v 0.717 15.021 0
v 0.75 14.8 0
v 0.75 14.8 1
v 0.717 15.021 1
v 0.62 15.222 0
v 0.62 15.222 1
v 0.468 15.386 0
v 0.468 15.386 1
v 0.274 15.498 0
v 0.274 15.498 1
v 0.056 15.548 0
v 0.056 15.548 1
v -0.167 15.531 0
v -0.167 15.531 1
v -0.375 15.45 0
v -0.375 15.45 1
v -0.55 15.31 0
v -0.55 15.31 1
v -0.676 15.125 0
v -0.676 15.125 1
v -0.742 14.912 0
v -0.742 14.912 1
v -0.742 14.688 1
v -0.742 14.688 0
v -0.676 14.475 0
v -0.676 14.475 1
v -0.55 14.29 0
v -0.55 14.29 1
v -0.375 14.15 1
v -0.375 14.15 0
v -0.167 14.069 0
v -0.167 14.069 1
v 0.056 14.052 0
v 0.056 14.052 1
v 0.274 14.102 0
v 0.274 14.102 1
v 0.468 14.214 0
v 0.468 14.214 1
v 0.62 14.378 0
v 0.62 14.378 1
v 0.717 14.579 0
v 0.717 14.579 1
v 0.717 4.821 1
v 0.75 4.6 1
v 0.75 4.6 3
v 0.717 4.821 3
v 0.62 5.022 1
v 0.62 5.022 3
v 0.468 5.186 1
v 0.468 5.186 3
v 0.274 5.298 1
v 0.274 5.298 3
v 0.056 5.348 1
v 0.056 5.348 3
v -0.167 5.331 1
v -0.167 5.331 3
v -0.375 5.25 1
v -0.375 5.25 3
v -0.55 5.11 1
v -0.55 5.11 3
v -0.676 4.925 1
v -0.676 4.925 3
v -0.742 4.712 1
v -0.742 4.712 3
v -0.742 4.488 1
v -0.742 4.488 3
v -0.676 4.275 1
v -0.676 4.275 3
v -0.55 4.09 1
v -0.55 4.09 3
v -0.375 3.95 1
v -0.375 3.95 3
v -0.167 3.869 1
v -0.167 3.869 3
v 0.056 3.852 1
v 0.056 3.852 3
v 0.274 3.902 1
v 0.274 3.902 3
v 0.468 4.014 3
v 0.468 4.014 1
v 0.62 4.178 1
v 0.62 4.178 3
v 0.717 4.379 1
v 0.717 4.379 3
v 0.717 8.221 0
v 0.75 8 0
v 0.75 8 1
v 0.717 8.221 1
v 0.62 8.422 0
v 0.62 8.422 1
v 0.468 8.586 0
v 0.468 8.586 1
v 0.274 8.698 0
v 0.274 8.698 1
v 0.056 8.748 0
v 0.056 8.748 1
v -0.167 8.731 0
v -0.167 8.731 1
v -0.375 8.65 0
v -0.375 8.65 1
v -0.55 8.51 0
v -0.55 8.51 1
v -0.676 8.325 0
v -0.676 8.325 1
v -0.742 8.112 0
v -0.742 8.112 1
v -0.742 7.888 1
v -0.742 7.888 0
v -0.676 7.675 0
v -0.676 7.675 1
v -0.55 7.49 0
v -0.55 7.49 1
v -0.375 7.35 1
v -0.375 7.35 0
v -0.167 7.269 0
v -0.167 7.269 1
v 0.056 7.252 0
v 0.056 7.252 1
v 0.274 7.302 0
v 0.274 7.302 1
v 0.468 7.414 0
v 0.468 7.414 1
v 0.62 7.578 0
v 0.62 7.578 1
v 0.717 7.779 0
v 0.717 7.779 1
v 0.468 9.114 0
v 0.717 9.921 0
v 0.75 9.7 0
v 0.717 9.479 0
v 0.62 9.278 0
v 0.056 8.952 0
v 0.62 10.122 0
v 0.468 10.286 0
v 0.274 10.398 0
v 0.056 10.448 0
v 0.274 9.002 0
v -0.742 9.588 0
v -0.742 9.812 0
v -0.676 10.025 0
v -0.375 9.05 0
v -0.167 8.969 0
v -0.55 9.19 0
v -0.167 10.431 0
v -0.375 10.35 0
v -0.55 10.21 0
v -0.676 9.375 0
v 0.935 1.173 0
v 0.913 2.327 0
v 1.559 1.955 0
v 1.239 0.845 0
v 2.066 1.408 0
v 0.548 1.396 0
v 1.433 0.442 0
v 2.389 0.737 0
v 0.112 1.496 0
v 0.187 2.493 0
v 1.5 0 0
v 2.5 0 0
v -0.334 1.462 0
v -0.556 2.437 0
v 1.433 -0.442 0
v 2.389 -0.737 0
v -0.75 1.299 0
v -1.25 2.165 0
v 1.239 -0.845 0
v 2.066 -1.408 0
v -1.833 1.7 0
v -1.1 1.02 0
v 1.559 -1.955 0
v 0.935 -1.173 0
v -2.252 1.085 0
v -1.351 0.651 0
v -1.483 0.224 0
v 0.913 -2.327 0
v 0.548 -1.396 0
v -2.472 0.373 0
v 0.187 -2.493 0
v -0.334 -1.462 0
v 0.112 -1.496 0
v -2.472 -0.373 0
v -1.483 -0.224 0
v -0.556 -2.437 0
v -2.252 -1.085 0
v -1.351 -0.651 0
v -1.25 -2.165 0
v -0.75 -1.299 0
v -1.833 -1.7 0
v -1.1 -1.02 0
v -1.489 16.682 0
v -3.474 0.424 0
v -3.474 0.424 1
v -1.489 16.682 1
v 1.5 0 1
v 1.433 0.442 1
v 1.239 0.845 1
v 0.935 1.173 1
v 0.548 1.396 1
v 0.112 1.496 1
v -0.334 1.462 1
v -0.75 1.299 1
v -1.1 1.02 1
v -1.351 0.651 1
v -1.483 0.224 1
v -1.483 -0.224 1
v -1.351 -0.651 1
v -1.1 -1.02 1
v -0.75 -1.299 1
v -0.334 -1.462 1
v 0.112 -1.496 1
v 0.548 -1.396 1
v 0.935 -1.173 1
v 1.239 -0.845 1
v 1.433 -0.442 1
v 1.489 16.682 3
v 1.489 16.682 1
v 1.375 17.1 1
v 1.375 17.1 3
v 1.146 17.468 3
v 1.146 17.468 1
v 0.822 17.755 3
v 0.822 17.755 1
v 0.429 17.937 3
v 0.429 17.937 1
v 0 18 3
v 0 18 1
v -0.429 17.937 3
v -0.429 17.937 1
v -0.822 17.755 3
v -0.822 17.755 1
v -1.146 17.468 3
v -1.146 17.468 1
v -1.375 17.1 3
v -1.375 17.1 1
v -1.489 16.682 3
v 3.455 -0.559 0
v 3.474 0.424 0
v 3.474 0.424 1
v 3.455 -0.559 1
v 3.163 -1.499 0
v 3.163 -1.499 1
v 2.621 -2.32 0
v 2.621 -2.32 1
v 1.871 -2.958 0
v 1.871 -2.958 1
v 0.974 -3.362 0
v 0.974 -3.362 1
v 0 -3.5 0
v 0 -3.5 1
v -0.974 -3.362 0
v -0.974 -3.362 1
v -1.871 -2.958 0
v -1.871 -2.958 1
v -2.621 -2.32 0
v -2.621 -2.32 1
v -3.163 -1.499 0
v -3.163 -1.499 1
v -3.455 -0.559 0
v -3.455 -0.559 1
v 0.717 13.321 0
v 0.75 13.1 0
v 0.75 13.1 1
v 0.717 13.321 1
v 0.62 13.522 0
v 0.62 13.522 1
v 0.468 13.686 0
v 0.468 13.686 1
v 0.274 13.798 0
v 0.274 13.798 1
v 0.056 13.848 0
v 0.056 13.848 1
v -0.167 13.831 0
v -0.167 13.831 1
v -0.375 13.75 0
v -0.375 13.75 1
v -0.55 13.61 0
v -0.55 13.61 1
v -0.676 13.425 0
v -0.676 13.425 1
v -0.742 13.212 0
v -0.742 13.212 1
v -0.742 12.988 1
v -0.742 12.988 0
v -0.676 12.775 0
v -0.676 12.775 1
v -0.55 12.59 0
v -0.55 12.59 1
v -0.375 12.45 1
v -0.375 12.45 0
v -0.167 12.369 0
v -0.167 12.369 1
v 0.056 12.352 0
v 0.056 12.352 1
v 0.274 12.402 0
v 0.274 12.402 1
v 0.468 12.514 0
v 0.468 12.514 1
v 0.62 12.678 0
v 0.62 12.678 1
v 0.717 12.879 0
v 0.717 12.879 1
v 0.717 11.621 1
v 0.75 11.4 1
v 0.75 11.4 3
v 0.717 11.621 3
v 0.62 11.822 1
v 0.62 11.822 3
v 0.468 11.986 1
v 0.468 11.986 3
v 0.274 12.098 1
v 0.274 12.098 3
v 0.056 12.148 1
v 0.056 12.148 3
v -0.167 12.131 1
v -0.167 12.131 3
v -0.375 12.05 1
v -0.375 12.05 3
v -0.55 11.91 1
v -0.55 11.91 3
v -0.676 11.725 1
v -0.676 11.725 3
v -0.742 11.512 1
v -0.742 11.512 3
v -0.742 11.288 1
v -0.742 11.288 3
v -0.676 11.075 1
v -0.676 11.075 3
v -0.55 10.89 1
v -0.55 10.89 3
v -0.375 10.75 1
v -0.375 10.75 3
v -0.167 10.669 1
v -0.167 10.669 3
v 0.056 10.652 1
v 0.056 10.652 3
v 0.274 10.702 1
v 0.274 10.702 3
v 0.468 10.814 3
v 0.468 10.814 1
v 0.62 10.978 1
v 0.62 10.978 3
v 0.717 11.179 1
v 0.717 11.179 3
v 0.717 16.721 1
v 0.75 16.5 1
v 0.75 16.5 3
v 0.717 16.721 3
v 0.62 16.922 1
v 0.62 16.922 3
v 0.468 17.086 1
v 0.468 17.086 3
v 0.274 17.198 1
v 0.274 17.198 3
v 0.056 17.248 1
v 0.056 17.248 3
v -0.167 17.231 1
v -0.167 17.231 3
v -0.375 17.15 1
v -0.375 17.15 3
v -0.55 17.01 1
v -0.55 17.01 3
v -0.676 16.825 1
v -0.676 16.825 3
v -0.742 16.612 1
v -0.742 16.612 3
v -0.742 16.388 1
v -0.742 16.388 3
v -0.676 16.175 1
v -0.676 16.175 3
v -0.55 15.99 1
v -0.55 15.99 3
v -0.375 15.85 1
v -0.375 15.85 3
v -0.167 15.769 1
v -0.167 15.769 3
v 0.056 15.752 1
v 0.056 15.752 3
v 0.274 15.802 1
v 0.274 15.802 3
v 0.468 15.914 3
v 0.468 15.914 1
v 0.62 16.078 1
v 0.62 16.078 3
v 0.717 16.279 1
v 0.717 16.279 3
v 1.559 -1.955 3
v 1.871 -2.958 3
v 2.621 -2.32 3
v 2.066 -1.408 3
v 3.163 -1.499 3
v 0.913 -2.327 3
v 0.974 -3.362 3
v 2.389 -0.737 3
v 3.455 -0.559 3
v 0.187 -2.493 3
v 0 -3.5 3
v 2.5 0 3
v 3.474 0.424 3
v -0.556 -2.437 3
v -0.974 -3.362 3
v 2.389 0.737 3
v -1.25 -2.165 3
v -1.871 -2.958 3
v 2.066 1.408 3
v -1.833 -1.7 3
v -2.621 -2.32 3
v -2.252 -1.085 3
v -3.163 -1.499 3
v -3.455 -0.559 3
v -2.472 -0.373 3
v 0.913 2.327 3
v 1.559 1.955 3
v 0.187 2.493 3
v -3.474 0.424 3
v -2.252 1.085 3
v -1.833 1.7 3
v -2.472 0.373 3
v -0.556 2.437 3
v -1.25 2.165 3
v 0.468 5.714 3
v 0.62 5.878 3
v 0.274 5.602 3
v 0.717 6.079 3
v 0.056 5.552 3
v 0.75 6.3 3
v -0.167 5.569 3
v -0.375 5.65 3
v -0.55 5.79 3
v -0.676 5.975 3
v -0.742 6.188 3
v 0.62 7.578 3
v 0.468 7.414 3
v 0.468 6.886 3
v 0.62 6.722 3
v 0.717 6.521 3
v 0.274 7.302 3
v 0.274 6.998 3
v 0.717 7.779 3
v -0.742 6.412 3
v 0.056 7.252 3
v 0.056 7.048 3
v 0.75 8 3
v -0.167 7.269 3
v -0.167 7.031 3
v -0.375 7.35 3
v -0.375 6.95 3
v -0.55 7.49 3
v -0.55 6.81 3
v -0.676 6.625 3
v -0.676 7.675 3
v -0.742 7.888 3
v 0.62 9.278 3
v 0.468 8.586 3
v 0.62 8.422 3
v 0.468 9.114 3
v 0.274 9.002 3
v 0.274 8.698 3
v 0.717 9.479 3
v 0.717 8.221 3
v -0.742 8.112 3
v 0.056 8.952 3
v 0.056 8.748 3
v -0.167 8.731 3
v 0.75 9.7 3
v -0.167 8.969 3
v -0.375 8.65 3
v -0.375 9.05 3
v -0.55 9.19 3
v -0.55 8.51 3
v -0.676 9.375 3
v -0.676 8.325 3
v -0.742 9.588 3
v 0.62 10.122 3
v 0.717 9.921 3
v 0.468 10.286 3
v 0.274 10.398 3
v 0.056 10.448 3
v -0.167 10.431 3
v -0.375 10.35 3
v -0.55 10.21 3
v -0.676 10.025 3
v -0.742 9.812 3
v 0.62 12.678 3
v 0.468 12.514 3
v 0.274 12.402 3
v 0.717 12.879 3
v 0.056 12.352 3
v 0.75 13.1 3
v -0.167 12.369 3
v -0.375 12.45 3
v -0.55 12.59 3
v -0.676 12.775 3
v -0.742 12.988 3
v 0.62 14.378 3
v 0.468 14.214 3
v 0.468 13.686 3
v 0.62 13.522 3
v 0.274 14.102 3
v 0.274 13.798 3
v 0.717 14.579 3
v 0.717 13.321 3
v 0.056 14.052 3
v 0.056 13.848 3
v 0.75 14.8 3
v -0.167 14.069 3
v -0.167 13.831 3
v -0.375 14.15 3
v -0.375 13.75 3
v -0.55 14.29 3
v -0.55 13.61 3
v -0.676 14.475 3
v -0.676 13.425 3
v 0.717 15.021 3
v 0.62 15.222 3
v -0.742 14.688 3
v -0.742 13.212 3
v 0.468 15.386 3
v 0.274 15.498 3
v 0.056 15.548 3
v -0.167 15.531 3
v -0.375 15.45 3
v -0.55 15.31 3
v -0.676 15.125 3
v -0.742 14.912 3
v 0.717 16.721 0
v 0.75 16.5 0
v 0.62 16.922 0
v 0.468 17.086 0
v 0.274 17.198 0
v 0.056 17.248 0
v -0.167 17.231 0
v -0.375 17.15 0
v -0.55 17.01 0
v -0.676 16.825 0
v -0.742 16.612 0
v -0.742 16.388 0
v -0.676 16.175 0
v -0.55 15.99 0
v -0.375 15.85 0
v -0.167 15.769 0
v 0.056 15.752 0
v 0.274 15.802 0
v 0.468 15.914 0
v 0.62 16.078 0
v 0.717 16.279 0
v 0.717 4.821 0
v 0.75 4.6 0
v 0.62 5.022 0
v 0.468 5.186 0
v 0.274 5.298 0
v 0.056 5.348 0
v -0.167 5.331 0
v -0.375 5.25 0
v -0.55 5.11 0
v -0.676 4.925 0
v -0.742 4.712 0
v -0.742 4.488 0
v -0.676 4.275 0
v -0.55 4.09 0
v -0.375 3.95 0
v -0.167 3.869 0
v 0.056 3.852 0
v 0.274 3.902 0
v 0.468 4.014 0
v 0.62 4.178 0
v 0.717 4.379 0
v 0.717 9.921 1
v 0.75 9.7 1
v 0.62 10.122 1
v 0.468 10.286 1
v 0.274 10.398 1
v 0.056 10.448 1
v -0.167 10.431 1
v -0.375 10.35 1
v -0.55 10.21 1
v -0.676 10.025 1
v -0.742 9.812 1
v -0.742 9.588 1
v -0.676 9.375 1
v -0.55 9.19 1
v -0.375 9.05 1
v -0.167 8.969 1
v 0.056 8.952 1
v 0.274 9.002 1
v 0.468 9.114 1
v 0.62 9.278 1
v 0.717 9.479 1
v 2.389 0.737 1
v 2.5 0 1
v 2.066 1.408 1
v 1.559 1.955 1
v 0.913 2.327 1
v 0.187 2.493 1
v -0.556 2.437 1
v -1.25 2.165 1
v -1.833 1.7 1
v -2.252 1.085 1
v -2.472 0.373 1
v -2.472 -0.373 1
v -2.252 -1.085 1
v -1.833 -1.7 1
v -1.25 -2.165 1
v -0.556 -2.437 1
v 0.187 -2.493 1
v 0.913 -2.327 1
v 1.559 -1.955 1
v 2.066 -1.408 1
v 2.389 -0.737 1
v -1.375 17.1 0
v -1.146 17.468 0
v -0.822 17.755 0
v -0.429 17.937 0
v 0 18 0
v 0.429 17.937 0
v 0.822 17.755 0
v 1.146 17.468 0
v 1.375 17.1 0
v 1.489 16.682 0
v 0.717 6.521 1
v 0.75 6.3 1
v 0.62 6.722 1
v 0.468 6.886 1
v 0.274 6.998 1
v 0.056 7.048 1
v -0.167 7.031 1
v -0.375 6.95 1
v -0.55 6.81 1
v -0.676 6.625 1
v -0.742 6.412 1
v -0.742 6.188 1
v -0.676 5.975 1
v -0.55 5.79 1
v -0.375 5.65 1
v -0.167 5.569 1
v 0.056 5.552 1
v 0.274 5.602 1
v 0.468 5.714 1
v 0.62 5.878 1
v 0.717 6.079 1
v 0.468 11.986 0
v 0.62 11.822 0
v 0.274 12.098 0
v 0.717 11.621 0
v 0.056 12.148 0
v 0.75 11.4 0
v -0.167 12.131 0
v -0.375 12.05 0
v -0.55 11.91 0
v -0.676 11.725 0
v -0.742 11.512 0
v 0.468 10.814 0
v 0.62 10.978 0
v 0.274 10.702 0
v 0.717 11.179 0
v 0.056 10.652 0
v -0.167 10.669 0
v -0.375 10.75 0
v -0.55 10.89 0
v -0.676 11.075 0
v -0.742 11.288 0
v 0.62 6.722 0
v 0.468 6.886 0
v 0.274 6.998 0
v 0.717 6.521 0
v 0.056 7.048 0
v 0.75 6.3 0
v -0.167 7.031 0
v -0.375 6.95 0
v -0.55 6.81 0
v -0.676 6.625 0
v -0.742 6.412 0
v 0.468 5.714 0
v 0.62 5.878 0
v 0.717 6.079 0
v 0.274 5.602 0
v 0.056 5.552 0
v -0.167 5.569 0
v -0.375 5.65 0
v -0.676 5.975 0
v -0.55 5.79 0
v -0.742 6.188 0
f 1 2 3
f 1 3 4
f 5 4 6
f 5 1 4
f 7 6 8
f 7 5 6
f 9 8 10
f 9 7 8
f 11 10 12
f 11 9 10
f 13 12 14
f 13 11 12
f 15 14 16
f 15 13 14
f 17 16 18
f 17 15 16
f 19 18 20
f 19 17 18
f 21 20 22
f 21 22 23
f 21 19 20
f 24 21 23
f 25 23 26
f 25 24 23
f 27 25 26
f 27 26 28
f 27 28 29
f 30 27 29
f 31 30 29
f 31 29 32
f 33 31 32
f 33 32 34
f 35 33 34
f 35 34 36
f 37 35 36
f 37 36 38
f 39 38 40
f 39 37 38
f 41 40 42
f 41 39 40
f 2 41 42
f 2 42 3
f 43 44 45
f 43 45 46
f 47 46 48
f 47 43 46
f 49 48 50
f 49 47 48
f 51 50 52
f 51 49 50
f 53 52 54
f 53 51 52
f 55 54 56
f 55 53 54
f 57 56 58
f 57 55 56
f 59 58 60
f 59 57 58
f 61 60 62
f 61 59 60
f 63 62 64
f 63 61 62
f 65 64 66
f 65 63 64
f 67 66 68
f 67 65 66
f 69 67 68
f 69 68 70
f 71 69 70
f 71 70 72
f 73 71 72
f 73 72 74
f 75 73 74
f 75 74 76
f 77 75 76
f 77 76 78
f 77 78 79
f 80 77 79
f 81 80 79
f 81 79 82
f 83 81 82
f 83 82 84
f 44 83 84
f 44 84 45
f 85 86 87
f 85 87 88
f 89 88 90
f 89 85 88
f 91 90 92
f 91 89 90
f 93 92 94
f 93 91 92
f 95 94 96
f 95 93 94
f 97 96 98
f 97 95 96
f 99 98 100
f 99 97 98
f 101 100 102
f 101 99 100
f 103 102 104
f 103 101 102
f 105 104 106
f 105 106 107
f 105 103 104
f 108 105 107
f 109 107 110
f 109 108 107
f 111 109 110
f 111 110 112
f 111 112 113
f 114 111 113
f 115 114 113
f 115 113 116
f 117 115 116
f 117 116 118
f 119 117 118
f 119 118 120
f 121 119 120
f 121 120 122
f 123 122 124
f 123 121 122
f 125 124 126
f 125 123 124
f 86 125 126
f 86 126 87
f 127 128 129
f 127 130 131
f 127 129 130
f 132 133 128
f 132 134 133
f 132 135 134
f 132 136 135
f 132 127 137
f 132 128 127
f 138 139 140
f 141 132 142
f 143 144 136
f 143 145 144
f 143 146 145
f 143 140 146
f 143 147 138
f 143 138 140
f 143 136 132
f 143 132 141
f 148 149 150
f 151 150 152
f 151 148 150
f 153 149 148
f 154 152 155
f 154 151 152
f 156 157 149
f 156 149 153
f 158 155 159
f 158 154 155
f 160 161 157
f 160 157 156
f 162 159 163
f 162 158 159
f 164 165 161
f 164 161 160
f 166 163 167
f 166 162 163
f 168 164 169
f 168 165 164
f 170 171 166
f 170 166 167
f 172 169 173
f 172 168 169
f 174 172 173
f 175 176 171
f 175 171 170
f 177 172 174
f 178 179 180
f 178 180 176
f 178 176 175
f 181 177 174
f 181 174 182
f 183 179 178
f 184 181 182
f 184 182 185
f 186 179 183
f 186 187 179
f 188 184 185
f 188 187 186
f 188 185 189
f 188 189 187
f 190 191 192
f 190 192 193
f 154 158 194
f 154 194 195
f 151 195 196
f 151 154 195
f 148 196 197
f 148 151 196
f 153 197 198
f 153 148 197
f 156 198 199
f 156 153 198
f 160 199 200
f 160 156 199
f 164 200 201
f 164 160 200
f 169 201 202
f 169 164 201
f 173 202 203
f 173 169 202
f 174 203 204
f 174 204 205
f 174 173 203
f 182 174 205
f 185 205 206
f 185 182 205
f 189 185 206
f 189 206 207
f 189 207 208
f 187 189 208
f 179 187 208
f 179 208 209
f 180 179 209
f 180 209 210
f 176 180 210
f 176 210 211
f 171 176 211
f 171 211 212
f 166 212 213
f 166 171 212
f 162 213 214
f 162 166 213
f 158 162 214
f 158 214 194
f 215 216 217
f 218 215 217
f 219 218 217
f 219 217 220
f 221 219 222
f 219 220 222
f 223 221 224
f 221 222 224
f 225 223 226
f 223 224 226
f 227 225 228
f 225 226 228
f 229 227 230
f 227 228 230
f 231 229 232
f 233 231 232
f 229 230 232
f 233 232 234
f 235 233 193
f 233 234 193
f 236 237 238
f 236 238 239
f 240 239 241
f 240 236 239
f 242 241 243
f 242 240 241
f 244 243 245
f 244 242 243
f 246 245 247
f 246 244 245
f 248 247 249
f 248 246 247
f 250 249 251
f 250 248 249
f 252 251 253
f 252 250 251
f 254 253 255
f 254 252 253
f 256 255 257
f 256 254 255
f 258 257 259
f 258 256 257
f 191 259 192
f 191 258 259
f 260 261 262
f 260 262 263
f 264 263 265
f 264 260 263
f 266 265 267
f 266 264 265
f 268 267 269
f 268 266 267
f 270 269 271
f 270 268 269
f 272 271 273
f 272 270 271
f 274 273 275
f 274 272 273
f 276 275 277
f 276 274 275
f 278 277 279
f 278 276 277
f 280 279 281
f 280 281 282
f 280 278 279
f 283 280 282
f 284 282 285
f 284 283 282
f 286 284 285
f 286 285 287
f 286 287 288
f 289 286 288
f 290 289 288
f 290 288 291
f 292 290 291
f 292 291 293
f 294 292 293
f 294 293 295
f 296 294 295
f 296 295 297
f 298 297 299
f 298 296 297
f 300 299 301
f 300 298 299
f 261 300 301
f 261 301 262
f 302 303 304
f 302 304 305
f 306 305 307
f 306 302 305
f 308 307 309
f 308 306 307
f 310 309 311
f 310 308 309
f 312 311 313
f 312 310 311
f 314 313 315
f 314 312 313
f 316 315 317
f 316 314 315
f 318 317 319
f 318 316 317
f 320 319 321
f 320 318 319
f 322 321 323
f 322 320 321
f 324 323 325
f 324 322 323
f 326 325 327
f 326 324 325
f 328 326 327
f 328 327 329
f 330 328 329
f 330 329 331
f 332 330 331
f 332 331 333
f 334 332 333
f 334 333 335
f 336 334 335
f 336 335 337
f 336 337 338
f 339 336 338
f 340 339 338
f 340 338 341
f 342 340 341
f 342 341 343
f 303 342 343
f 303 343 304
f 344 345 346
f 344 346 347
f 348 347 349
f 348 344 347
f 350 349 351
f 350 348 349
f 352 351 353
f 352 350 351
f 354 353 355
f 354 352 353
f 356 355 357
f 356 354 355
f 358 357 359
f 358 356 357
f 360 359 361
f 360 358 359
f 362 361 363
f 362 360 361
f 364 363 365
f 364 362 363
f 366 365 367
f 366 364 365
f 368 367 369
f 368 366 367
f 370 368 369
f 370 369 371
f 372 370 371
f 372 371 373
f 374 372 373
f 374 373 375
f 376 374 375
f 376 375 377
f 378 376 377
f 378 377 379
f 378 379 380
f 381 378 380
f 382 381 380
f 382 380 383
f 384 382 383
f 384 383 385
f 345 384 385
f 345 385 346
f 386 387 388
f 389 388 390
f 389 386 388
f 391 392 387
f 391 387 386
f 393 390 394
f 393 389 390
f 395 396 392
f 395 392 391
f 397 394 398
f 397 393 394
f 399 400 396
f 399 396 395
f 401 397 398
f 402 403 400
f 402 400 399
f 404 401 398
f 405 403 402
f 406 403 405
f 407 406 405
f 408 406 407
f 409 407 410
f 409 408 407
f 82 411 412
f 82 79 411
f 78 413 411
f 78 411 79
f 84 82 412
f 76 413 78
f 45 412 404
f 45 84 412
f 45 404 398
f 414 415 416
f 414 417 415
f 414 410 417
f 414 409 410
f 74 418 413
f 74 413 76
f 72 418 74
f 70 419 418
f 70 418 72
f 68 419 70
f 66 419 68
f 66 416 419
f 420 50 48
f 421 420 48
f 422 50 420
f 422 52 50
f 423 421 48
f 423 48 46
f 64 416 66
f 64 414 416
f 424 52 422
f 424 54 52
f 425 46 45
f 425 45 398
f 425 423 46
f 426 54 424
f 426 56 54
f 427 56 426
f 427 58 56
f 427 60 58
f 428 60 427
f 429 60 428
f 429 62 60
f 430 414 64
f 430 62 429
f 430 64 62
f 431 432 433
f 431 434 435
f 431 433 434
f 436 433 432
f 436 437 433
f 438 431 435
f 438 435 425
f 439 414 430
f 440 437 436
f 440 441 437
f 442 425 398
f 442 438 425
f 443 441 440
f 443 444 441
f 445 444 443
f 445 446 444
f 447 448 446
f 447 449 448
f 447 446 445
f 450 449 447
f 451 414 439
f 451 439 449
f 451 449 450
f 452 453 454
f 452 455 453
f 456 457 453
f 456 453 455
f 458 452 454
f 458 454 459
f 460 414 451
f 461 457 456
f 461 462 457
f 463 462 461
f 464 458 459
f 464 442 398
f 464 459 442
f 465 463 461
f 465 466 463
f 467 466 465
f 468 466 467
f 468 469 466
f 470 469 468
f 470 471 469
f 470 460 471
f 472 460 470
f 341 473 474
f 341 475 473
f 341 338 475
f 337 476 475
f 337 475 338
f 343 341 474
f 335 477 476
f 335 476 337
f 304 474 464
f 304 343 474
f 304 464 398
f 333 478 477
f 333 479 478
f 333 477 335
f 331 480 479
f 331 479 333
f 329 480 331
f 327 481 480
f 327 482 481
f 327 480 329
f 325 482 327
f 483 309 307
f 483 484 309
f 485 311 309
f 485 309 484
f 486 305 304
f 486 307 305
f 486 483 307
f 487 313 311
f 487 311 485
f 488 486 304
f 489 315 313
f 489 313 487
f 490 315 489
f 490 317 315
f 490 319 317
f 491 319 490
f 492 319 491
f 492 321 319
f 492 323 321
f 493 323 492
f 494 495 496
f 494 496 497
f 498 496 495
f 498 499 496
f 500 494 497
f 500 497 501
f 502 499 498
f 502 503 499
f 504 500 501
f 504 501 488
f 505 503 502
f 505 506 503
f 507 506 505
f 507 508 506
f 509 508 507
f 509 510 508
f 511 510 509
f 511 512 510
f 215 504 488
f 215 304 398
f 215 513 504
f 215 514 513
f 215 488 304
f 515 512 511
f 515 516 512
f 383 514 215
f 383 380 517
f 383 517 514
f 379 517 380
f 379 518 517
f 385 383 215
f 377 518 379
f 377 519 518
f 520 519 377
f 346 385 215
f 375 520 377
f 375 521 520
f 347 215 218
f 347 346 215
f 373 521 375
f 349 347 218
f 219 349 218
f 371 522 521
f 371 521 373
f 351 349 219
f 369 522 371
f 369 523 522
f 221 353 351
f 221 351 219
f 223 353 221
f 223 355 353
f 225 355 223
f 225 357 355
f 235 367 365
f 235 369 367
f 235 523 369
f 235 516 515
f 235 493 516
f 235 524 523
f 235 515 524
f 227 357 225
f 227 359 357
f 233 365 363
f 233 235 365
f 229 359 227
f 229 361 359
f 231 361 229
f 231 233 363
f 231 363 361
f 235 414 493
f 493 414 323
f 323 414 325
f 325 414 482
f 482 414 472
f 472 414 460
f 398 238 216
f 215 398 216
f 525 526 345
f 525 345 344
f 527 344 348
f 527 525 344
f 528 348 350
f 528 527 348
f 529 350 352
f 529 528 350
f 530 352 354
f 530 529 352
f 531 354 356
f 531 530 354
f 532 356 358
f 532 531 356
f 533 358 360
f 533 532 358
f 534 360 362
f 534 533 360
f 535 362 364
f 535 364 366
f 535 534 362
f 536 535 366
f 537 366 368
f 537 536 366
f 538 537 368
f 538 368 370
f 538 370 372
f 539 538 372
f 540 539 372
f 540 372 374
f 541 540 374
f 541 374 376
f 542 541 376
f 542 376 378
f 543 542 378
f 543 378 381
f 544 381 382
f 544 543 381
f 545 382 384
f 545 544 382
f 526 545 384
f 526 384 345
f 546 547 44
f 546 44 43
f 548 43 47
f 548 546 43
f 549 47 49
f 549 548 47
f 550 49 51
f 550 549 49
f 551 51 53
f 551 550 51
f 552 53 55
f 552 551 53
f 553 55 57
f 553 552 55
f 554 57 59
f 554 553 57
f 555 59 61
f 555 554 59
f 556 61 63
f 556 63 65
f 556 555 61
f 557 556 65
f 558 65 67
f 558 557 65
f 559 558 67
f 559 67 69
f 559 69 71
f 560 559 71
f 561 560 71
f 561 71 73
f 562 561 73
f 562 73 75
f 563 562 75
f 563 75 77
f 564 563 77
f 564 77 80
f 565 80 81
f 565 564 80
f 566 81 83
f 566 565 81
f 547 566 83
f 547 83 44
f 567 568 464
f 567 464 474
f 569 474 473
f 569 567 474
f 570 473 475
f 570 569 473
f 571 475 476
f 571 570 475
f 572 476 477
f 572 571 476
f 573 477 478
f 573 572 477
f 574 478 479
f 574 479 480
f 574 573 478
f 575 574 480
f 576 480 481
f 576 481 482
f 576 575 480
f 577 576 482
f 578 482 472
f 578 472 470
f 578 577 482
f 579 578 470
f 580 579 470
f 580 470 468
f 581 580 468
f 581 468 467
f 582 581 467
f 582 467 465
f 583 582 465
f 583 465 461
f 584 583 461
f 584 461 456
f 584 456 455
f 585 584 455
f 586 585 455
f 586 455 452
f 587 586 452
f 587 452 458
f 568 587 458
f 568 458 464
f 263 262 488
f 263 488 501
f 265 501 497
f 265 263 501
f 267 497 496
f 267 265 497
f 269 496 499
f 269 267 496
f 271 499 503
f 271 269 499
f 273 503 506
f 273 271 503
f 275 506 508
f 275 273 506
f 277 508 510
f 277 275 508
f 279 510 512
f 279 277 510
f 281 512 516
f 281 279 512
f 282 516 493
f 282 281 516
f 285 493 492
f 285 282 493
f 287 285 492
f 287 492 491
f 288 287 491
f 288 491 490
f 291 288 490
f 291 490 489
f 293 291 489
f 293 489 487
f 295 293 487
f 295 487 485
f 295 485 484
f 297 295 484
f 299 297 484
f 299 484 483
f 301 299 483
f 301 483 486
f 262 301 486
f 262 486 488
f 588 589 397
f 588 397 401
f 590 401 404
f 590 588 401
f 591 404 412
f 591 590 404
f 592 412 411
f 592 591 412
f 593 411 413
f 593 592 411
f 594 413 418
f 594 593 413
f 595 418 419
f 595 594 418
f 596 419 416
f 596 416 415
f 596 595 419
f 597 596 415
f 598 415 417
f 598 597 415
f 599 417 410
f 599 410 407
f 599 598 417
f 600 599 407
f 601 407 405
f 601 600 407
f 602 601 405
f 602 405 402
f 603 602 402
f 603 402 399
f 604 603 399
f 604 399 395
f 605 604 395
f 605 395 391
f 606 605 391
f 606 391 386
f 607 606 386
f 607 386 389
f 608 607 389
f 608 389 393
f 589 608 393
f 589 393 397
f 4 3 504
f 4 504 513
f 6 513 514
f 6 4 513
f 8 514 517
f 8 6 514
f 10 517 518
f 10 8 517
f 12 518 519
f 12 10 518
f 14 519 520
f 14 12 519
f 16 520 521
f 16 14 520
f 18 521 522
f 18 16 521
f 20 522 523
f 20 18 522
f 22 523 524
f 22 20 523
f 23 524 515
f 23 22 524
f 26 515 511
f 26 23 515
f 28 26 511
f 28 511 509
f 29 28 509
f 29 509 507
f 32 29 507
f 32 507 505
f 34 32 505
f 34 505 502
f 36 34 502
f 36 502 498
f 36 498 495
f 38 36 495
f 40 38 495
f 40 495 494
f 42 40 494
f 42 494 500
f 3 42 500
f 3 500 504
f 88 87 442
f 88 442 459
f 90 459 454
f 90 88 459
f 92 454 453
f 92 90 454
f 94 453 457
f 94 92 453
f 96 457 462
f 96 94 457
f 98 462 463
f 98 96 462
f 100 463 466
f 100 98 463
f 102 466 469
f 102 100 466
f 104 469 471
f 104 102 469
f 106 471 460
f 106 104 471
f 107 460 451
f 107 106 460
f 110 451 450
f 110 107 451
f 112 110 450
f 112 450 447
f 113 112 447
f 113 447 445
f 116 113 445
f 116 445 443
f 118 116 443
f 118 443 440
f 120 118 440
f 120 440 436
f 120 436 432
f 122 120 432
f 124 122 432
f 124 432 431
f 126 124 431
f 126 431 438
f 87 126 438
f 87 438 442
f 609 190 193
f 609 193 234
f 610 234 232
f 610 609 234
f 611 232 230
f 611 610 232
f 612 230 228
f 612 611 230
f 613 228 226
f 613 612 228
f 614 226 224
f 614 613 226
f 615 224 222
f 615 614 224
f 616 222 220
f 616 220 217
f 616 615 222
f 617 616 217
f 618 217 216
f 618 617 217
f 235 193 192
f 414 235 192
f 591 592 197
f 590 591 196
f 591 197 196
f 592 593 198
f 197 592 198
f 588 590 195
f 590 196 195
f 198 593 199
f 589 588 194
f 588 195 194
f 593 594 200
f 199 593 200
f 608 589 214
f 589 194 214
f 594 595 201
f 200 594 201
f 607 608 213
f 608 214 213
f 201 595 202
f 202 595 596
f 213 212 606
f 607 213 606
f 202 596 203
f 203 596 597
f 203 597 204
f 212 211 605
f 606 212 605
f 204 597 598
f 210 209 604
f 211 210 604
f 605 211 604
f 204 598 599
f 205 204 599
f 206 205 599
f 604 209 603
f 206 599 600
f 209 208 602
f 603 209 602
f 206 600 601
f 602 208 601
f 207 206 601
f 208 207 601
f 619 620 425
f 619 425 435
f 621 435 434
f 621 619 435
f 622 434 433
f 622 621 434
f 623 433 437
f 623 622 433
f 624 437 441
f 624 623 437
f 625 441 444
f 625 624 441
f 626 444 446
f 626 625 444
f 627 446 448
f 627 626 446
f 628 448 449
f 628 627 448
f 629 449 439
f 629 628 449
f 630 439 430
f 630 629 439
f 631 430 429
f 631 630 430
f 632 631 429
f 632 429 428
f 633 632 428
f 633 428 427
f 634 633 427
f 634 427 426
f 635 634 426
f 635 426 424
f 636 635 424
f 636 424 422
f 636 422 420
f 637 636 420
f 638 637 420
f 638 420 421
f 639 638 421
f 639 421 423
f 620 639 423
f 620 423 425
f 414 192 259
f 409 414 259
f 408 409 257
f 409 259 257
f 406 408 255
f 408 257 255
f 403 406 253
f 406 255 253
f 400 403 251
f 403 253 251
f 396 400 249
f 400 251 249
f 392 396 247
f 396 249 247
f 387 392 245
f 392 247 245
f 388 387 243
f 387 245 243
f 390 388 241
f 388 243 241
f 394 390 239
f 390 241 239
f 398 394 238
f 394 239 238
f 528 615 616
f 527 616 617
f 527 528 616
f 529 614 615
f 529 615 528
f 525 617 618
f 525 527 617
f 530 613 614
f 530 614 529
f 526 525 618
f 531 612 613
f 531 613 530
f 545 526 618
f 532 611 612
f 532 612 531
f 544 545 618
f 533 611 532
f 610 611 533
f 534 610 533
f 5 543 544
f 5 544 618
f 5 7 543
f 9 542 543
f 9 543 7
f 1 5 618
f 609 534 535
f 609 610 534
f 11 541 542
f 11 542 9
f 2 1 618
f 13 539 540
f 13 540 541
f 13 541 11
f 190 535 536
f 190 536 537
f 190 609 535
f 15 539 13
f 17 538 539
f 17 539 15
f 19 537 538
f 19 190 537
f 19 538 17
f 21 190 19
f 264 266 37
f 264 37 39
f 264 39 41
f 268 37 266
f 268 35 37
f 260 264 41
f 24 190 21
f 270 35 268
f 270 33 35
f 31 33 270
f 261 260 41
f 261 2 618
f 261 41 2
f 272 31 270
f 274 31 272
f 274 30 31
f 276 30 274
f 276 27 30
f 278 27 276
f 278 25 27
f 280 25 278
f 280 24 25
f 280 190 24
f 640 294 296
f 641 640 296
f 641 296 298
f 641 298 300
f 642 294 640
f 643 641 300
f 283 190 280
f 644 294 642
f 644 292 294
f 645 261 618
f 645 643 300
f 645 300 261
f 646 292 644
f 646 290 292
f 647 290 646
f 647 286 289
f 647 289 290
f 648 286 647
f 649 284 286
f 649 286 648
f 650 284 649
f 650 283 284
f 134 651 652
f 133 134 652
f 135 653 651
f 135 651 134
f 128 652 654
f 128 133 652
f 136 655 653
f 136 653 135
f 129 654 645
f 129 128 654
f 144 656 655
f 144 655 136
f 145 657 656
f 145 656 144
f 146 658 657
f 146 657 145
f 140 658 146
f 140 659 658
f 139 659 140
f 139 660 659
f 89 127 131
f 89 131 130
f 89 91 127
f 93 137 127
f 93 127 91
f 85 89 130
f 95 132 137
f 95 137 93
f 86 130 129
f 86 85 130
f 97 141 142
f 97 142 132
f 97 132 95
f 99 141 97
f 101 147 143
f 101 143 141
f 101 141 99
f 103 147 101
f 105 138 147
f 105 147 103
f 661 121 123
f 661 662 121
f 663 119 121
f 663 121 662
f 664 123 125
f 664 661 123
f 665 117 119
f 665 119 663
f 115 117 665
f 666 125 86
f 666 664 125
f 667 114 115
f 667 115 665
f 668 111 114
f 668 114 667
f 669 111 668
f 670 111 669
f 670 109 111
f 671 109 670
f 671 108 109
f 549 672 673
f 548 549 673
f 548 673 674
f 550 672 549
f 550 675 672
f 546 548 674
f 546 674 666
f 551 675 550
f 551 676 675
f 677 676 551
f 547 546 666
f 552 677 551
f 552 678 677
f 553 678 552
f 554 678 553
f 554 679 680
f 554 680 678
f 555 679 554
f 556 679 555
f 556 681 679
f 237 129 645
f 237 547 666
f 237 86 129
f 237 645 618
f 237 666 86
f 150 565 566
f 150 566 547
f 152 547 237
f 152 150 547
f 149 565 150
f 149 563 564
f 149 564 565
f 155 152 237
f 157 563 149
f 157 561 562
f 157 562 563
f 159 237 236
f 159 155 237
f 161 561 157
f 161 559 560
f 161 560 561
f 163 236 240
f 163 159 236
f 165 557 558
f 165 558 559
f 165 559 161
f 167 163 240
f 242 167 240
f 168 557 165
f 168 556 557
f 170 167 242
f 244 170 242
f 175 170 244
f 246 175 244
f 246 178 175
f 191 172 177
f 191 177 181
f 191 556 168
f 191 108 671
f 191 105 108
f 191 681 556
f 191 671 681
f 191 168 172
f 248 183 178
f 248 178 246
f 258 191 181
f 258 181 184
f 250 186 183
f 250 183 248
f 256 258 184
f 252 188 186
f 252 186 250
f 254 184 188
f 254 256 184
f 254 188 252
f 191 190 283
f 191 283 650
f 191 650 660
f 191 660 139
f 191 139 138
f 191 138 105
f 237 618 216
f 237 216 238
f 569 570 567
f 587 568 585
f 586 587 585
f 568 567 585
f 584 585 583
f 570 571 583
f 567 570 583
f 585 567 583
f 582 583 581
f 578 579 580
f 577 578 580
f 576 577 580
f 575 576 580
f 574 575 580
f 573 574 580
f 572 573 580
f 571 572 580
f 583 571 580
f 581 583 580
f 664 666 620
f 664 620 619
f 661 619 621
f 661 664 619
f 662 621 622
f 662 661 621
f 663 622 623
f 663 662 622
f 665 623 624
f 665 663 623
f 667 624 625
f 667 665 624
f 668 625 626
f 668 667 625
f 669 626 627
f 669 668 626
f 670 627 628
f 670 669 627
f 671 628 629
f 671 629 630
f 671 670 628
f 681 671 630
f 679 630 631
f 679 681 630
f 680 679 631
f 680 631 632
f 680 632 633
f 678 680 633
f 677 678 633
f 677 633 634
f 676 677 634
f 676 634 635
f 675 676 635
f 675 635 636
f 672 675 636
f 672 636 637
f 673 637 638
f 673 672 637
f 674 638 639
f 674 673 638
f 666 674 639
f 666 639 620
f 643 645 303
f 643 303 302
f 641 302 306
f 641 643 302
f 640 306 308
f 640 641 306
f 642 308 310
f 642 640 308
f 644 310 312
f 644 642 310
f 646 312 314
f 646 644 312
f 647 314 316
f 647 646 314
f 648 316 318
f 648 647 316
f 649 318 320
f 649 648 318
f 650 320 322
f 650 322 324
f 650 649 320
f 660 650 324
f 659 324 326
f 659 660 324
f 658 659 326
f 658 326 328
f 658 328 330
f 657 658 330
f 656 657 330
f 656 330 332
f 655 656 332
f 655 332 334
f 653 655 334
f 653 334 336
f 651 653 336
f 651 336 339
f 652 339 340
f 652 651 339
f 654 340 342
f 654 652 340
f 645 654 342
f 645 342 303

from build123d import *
from build123d.topology import SkipClean

# Parameters (mm, degrees)
SKETCH2_R           = 0.75
SKETCH2_R_2         = 1.5
BOSS_EXTRUDE1_DEPTH = 1
SKETCH2_3_R         = 2.5
SKETCH2_3_R_2       = 0.75
BOSS_EXTRUDE2_DEPTH = 3


with BuildPart() as part:
    # Sketch2 → Boss-Extrude1 (new body)
    with BuildSketch(Plane(origin=(0, 0, 0), x_dir=(0, 1, 0), z_dir=(0, 0, 1))):
        with BuildLine():
            Line((0.424242424, 3.474193196), (16.681818182, 1.488939941))
            ThreePointArc((16.681818182, 1.488939941), (18, 0), (16.681818182, -1.488939941))
            Line((16.681818182, -1.488939941), (0.424242424, -3.474193196))
            ThreePointArc((0.424242424, -3.474193196), (-3.5, 0), (0.424242424, 3.474193196))
        make_face()
        with Locations(Location((16.5, 0, 0), (0, 0, 270))):
            Circle(SKETCH2_R, mode=Mode.SUBTRACT)
        with Locations(Location((14.8, 0, 0), (0, 0, 270))):
            Circle(SKETCH2_R, mode=Mode.SUBTRACT)
        with Locations(Location((13.1, 0, 0), (0, 0, 270))):
            Circle(SKETCH2_R, mode=Mode.SUBTRACT)
        with Locations(Location((11.4, 0, 0), (0, 0, 270))):
            Circle(SKETCH2_R, mode=Mode.SUBTRACT)
        with Locations(Location((8, 0, 0), (0, 0, 270))):
            Circle(SKETCH2_R, mode=Mode.SUBTRACT)
        with Locations(Location((6.3, 0, 0), (0, 0, 270))):
            Circle(SKETCH2_R, mode=Mode.SUBTRACT)
        with Locations(Location((4.6, 0, 0), (0, 0, 270))):
            Circle(SKETCH2_R, mode=Mode.SUBTRACT)
        with Locations(Location((0, 0, 0), (0, 0, 270))):
            Circle(SKETCH2_R_2, mode=Mode.SUBTRACT)
    extrude(amount=BOSS_EXTRUDE1_DEPTH)

    # Sketch2<3> → Boss-Extrude2 (add)
    with SkipClean():  # the faces are left unmerged after this step: merging them gives an invalid solid
        with BuildSketch(Plane(origin=(0, 0, 0), x_dir=(0, 1, 0), z_dir=(0, 0, 1))):
            with BuildLine():
                ThreePointArc((0.424242424, 3.474193196), (-3.5, 0), (0.424242424, -3.474193196))
                Line((0.424242424, -3.474193196), (16.681818182, -1.488939941))
                ThreePointArc((16.681818182, -1.488939941), (18, 0), (16.681818182, 1.488939941))
                Line((16.681818182, 1.488939941), (0.424242424, 3.474193196))
            make_face()
            with Locations(Location((0, 0, 0), (0, 0, 270))):
                Circle(SKETCH2_3_R, mode=Mode.SUBTRACT)
            with Locations(Location((16.5, 0, 0), (0, 0, 270))):
                Circle(SKETCH2_3_R_2, mode=Mode.SUBTRACT)
            with Locations(Location((4.6, 0, 0), (0, 0, 270))):
                Circle(SKETCH2_3_R_2, mode=Mode.SUBTRACT)
            with Locations(Location((6.3, 0, 0), (0, 0, 270))):
                Circle(SKETCH2_3_R_2, mode=Mode.SUBTRACT)
            with Locations(Location((8, 0, 0), (0, 0, 270))):
                Circle(SKETCH2_3_R_2, mode=Mode.SUBTRACT)
            with Locations(Location((9.7, 0, 0), (0, 0, 270))):
                Circle(SKETCH2_3_R_2, mode=Mode.SUBTRACT)
            with Locations(Location((11.4, 0, 0), (0, 0, 270))):
                Circle(SKETCH2_3_R_2, mode=Mode.SUBTRACT)
            with Locations(Location((13.1, 0, 0), (0, 0, 270))):
                Circle(SKETCH2_3_R_2, mode=Mode.SUBTRACT)
            with Locations(Location((14.8, 0, 0), (0, 0, 270))):
                Circle(SKETCH2_3_R_2, mode=Mode.SUBTRACT)
        extrude(amount=BOSS_EXTRUDE2_DEPTH)


solid = part.part
